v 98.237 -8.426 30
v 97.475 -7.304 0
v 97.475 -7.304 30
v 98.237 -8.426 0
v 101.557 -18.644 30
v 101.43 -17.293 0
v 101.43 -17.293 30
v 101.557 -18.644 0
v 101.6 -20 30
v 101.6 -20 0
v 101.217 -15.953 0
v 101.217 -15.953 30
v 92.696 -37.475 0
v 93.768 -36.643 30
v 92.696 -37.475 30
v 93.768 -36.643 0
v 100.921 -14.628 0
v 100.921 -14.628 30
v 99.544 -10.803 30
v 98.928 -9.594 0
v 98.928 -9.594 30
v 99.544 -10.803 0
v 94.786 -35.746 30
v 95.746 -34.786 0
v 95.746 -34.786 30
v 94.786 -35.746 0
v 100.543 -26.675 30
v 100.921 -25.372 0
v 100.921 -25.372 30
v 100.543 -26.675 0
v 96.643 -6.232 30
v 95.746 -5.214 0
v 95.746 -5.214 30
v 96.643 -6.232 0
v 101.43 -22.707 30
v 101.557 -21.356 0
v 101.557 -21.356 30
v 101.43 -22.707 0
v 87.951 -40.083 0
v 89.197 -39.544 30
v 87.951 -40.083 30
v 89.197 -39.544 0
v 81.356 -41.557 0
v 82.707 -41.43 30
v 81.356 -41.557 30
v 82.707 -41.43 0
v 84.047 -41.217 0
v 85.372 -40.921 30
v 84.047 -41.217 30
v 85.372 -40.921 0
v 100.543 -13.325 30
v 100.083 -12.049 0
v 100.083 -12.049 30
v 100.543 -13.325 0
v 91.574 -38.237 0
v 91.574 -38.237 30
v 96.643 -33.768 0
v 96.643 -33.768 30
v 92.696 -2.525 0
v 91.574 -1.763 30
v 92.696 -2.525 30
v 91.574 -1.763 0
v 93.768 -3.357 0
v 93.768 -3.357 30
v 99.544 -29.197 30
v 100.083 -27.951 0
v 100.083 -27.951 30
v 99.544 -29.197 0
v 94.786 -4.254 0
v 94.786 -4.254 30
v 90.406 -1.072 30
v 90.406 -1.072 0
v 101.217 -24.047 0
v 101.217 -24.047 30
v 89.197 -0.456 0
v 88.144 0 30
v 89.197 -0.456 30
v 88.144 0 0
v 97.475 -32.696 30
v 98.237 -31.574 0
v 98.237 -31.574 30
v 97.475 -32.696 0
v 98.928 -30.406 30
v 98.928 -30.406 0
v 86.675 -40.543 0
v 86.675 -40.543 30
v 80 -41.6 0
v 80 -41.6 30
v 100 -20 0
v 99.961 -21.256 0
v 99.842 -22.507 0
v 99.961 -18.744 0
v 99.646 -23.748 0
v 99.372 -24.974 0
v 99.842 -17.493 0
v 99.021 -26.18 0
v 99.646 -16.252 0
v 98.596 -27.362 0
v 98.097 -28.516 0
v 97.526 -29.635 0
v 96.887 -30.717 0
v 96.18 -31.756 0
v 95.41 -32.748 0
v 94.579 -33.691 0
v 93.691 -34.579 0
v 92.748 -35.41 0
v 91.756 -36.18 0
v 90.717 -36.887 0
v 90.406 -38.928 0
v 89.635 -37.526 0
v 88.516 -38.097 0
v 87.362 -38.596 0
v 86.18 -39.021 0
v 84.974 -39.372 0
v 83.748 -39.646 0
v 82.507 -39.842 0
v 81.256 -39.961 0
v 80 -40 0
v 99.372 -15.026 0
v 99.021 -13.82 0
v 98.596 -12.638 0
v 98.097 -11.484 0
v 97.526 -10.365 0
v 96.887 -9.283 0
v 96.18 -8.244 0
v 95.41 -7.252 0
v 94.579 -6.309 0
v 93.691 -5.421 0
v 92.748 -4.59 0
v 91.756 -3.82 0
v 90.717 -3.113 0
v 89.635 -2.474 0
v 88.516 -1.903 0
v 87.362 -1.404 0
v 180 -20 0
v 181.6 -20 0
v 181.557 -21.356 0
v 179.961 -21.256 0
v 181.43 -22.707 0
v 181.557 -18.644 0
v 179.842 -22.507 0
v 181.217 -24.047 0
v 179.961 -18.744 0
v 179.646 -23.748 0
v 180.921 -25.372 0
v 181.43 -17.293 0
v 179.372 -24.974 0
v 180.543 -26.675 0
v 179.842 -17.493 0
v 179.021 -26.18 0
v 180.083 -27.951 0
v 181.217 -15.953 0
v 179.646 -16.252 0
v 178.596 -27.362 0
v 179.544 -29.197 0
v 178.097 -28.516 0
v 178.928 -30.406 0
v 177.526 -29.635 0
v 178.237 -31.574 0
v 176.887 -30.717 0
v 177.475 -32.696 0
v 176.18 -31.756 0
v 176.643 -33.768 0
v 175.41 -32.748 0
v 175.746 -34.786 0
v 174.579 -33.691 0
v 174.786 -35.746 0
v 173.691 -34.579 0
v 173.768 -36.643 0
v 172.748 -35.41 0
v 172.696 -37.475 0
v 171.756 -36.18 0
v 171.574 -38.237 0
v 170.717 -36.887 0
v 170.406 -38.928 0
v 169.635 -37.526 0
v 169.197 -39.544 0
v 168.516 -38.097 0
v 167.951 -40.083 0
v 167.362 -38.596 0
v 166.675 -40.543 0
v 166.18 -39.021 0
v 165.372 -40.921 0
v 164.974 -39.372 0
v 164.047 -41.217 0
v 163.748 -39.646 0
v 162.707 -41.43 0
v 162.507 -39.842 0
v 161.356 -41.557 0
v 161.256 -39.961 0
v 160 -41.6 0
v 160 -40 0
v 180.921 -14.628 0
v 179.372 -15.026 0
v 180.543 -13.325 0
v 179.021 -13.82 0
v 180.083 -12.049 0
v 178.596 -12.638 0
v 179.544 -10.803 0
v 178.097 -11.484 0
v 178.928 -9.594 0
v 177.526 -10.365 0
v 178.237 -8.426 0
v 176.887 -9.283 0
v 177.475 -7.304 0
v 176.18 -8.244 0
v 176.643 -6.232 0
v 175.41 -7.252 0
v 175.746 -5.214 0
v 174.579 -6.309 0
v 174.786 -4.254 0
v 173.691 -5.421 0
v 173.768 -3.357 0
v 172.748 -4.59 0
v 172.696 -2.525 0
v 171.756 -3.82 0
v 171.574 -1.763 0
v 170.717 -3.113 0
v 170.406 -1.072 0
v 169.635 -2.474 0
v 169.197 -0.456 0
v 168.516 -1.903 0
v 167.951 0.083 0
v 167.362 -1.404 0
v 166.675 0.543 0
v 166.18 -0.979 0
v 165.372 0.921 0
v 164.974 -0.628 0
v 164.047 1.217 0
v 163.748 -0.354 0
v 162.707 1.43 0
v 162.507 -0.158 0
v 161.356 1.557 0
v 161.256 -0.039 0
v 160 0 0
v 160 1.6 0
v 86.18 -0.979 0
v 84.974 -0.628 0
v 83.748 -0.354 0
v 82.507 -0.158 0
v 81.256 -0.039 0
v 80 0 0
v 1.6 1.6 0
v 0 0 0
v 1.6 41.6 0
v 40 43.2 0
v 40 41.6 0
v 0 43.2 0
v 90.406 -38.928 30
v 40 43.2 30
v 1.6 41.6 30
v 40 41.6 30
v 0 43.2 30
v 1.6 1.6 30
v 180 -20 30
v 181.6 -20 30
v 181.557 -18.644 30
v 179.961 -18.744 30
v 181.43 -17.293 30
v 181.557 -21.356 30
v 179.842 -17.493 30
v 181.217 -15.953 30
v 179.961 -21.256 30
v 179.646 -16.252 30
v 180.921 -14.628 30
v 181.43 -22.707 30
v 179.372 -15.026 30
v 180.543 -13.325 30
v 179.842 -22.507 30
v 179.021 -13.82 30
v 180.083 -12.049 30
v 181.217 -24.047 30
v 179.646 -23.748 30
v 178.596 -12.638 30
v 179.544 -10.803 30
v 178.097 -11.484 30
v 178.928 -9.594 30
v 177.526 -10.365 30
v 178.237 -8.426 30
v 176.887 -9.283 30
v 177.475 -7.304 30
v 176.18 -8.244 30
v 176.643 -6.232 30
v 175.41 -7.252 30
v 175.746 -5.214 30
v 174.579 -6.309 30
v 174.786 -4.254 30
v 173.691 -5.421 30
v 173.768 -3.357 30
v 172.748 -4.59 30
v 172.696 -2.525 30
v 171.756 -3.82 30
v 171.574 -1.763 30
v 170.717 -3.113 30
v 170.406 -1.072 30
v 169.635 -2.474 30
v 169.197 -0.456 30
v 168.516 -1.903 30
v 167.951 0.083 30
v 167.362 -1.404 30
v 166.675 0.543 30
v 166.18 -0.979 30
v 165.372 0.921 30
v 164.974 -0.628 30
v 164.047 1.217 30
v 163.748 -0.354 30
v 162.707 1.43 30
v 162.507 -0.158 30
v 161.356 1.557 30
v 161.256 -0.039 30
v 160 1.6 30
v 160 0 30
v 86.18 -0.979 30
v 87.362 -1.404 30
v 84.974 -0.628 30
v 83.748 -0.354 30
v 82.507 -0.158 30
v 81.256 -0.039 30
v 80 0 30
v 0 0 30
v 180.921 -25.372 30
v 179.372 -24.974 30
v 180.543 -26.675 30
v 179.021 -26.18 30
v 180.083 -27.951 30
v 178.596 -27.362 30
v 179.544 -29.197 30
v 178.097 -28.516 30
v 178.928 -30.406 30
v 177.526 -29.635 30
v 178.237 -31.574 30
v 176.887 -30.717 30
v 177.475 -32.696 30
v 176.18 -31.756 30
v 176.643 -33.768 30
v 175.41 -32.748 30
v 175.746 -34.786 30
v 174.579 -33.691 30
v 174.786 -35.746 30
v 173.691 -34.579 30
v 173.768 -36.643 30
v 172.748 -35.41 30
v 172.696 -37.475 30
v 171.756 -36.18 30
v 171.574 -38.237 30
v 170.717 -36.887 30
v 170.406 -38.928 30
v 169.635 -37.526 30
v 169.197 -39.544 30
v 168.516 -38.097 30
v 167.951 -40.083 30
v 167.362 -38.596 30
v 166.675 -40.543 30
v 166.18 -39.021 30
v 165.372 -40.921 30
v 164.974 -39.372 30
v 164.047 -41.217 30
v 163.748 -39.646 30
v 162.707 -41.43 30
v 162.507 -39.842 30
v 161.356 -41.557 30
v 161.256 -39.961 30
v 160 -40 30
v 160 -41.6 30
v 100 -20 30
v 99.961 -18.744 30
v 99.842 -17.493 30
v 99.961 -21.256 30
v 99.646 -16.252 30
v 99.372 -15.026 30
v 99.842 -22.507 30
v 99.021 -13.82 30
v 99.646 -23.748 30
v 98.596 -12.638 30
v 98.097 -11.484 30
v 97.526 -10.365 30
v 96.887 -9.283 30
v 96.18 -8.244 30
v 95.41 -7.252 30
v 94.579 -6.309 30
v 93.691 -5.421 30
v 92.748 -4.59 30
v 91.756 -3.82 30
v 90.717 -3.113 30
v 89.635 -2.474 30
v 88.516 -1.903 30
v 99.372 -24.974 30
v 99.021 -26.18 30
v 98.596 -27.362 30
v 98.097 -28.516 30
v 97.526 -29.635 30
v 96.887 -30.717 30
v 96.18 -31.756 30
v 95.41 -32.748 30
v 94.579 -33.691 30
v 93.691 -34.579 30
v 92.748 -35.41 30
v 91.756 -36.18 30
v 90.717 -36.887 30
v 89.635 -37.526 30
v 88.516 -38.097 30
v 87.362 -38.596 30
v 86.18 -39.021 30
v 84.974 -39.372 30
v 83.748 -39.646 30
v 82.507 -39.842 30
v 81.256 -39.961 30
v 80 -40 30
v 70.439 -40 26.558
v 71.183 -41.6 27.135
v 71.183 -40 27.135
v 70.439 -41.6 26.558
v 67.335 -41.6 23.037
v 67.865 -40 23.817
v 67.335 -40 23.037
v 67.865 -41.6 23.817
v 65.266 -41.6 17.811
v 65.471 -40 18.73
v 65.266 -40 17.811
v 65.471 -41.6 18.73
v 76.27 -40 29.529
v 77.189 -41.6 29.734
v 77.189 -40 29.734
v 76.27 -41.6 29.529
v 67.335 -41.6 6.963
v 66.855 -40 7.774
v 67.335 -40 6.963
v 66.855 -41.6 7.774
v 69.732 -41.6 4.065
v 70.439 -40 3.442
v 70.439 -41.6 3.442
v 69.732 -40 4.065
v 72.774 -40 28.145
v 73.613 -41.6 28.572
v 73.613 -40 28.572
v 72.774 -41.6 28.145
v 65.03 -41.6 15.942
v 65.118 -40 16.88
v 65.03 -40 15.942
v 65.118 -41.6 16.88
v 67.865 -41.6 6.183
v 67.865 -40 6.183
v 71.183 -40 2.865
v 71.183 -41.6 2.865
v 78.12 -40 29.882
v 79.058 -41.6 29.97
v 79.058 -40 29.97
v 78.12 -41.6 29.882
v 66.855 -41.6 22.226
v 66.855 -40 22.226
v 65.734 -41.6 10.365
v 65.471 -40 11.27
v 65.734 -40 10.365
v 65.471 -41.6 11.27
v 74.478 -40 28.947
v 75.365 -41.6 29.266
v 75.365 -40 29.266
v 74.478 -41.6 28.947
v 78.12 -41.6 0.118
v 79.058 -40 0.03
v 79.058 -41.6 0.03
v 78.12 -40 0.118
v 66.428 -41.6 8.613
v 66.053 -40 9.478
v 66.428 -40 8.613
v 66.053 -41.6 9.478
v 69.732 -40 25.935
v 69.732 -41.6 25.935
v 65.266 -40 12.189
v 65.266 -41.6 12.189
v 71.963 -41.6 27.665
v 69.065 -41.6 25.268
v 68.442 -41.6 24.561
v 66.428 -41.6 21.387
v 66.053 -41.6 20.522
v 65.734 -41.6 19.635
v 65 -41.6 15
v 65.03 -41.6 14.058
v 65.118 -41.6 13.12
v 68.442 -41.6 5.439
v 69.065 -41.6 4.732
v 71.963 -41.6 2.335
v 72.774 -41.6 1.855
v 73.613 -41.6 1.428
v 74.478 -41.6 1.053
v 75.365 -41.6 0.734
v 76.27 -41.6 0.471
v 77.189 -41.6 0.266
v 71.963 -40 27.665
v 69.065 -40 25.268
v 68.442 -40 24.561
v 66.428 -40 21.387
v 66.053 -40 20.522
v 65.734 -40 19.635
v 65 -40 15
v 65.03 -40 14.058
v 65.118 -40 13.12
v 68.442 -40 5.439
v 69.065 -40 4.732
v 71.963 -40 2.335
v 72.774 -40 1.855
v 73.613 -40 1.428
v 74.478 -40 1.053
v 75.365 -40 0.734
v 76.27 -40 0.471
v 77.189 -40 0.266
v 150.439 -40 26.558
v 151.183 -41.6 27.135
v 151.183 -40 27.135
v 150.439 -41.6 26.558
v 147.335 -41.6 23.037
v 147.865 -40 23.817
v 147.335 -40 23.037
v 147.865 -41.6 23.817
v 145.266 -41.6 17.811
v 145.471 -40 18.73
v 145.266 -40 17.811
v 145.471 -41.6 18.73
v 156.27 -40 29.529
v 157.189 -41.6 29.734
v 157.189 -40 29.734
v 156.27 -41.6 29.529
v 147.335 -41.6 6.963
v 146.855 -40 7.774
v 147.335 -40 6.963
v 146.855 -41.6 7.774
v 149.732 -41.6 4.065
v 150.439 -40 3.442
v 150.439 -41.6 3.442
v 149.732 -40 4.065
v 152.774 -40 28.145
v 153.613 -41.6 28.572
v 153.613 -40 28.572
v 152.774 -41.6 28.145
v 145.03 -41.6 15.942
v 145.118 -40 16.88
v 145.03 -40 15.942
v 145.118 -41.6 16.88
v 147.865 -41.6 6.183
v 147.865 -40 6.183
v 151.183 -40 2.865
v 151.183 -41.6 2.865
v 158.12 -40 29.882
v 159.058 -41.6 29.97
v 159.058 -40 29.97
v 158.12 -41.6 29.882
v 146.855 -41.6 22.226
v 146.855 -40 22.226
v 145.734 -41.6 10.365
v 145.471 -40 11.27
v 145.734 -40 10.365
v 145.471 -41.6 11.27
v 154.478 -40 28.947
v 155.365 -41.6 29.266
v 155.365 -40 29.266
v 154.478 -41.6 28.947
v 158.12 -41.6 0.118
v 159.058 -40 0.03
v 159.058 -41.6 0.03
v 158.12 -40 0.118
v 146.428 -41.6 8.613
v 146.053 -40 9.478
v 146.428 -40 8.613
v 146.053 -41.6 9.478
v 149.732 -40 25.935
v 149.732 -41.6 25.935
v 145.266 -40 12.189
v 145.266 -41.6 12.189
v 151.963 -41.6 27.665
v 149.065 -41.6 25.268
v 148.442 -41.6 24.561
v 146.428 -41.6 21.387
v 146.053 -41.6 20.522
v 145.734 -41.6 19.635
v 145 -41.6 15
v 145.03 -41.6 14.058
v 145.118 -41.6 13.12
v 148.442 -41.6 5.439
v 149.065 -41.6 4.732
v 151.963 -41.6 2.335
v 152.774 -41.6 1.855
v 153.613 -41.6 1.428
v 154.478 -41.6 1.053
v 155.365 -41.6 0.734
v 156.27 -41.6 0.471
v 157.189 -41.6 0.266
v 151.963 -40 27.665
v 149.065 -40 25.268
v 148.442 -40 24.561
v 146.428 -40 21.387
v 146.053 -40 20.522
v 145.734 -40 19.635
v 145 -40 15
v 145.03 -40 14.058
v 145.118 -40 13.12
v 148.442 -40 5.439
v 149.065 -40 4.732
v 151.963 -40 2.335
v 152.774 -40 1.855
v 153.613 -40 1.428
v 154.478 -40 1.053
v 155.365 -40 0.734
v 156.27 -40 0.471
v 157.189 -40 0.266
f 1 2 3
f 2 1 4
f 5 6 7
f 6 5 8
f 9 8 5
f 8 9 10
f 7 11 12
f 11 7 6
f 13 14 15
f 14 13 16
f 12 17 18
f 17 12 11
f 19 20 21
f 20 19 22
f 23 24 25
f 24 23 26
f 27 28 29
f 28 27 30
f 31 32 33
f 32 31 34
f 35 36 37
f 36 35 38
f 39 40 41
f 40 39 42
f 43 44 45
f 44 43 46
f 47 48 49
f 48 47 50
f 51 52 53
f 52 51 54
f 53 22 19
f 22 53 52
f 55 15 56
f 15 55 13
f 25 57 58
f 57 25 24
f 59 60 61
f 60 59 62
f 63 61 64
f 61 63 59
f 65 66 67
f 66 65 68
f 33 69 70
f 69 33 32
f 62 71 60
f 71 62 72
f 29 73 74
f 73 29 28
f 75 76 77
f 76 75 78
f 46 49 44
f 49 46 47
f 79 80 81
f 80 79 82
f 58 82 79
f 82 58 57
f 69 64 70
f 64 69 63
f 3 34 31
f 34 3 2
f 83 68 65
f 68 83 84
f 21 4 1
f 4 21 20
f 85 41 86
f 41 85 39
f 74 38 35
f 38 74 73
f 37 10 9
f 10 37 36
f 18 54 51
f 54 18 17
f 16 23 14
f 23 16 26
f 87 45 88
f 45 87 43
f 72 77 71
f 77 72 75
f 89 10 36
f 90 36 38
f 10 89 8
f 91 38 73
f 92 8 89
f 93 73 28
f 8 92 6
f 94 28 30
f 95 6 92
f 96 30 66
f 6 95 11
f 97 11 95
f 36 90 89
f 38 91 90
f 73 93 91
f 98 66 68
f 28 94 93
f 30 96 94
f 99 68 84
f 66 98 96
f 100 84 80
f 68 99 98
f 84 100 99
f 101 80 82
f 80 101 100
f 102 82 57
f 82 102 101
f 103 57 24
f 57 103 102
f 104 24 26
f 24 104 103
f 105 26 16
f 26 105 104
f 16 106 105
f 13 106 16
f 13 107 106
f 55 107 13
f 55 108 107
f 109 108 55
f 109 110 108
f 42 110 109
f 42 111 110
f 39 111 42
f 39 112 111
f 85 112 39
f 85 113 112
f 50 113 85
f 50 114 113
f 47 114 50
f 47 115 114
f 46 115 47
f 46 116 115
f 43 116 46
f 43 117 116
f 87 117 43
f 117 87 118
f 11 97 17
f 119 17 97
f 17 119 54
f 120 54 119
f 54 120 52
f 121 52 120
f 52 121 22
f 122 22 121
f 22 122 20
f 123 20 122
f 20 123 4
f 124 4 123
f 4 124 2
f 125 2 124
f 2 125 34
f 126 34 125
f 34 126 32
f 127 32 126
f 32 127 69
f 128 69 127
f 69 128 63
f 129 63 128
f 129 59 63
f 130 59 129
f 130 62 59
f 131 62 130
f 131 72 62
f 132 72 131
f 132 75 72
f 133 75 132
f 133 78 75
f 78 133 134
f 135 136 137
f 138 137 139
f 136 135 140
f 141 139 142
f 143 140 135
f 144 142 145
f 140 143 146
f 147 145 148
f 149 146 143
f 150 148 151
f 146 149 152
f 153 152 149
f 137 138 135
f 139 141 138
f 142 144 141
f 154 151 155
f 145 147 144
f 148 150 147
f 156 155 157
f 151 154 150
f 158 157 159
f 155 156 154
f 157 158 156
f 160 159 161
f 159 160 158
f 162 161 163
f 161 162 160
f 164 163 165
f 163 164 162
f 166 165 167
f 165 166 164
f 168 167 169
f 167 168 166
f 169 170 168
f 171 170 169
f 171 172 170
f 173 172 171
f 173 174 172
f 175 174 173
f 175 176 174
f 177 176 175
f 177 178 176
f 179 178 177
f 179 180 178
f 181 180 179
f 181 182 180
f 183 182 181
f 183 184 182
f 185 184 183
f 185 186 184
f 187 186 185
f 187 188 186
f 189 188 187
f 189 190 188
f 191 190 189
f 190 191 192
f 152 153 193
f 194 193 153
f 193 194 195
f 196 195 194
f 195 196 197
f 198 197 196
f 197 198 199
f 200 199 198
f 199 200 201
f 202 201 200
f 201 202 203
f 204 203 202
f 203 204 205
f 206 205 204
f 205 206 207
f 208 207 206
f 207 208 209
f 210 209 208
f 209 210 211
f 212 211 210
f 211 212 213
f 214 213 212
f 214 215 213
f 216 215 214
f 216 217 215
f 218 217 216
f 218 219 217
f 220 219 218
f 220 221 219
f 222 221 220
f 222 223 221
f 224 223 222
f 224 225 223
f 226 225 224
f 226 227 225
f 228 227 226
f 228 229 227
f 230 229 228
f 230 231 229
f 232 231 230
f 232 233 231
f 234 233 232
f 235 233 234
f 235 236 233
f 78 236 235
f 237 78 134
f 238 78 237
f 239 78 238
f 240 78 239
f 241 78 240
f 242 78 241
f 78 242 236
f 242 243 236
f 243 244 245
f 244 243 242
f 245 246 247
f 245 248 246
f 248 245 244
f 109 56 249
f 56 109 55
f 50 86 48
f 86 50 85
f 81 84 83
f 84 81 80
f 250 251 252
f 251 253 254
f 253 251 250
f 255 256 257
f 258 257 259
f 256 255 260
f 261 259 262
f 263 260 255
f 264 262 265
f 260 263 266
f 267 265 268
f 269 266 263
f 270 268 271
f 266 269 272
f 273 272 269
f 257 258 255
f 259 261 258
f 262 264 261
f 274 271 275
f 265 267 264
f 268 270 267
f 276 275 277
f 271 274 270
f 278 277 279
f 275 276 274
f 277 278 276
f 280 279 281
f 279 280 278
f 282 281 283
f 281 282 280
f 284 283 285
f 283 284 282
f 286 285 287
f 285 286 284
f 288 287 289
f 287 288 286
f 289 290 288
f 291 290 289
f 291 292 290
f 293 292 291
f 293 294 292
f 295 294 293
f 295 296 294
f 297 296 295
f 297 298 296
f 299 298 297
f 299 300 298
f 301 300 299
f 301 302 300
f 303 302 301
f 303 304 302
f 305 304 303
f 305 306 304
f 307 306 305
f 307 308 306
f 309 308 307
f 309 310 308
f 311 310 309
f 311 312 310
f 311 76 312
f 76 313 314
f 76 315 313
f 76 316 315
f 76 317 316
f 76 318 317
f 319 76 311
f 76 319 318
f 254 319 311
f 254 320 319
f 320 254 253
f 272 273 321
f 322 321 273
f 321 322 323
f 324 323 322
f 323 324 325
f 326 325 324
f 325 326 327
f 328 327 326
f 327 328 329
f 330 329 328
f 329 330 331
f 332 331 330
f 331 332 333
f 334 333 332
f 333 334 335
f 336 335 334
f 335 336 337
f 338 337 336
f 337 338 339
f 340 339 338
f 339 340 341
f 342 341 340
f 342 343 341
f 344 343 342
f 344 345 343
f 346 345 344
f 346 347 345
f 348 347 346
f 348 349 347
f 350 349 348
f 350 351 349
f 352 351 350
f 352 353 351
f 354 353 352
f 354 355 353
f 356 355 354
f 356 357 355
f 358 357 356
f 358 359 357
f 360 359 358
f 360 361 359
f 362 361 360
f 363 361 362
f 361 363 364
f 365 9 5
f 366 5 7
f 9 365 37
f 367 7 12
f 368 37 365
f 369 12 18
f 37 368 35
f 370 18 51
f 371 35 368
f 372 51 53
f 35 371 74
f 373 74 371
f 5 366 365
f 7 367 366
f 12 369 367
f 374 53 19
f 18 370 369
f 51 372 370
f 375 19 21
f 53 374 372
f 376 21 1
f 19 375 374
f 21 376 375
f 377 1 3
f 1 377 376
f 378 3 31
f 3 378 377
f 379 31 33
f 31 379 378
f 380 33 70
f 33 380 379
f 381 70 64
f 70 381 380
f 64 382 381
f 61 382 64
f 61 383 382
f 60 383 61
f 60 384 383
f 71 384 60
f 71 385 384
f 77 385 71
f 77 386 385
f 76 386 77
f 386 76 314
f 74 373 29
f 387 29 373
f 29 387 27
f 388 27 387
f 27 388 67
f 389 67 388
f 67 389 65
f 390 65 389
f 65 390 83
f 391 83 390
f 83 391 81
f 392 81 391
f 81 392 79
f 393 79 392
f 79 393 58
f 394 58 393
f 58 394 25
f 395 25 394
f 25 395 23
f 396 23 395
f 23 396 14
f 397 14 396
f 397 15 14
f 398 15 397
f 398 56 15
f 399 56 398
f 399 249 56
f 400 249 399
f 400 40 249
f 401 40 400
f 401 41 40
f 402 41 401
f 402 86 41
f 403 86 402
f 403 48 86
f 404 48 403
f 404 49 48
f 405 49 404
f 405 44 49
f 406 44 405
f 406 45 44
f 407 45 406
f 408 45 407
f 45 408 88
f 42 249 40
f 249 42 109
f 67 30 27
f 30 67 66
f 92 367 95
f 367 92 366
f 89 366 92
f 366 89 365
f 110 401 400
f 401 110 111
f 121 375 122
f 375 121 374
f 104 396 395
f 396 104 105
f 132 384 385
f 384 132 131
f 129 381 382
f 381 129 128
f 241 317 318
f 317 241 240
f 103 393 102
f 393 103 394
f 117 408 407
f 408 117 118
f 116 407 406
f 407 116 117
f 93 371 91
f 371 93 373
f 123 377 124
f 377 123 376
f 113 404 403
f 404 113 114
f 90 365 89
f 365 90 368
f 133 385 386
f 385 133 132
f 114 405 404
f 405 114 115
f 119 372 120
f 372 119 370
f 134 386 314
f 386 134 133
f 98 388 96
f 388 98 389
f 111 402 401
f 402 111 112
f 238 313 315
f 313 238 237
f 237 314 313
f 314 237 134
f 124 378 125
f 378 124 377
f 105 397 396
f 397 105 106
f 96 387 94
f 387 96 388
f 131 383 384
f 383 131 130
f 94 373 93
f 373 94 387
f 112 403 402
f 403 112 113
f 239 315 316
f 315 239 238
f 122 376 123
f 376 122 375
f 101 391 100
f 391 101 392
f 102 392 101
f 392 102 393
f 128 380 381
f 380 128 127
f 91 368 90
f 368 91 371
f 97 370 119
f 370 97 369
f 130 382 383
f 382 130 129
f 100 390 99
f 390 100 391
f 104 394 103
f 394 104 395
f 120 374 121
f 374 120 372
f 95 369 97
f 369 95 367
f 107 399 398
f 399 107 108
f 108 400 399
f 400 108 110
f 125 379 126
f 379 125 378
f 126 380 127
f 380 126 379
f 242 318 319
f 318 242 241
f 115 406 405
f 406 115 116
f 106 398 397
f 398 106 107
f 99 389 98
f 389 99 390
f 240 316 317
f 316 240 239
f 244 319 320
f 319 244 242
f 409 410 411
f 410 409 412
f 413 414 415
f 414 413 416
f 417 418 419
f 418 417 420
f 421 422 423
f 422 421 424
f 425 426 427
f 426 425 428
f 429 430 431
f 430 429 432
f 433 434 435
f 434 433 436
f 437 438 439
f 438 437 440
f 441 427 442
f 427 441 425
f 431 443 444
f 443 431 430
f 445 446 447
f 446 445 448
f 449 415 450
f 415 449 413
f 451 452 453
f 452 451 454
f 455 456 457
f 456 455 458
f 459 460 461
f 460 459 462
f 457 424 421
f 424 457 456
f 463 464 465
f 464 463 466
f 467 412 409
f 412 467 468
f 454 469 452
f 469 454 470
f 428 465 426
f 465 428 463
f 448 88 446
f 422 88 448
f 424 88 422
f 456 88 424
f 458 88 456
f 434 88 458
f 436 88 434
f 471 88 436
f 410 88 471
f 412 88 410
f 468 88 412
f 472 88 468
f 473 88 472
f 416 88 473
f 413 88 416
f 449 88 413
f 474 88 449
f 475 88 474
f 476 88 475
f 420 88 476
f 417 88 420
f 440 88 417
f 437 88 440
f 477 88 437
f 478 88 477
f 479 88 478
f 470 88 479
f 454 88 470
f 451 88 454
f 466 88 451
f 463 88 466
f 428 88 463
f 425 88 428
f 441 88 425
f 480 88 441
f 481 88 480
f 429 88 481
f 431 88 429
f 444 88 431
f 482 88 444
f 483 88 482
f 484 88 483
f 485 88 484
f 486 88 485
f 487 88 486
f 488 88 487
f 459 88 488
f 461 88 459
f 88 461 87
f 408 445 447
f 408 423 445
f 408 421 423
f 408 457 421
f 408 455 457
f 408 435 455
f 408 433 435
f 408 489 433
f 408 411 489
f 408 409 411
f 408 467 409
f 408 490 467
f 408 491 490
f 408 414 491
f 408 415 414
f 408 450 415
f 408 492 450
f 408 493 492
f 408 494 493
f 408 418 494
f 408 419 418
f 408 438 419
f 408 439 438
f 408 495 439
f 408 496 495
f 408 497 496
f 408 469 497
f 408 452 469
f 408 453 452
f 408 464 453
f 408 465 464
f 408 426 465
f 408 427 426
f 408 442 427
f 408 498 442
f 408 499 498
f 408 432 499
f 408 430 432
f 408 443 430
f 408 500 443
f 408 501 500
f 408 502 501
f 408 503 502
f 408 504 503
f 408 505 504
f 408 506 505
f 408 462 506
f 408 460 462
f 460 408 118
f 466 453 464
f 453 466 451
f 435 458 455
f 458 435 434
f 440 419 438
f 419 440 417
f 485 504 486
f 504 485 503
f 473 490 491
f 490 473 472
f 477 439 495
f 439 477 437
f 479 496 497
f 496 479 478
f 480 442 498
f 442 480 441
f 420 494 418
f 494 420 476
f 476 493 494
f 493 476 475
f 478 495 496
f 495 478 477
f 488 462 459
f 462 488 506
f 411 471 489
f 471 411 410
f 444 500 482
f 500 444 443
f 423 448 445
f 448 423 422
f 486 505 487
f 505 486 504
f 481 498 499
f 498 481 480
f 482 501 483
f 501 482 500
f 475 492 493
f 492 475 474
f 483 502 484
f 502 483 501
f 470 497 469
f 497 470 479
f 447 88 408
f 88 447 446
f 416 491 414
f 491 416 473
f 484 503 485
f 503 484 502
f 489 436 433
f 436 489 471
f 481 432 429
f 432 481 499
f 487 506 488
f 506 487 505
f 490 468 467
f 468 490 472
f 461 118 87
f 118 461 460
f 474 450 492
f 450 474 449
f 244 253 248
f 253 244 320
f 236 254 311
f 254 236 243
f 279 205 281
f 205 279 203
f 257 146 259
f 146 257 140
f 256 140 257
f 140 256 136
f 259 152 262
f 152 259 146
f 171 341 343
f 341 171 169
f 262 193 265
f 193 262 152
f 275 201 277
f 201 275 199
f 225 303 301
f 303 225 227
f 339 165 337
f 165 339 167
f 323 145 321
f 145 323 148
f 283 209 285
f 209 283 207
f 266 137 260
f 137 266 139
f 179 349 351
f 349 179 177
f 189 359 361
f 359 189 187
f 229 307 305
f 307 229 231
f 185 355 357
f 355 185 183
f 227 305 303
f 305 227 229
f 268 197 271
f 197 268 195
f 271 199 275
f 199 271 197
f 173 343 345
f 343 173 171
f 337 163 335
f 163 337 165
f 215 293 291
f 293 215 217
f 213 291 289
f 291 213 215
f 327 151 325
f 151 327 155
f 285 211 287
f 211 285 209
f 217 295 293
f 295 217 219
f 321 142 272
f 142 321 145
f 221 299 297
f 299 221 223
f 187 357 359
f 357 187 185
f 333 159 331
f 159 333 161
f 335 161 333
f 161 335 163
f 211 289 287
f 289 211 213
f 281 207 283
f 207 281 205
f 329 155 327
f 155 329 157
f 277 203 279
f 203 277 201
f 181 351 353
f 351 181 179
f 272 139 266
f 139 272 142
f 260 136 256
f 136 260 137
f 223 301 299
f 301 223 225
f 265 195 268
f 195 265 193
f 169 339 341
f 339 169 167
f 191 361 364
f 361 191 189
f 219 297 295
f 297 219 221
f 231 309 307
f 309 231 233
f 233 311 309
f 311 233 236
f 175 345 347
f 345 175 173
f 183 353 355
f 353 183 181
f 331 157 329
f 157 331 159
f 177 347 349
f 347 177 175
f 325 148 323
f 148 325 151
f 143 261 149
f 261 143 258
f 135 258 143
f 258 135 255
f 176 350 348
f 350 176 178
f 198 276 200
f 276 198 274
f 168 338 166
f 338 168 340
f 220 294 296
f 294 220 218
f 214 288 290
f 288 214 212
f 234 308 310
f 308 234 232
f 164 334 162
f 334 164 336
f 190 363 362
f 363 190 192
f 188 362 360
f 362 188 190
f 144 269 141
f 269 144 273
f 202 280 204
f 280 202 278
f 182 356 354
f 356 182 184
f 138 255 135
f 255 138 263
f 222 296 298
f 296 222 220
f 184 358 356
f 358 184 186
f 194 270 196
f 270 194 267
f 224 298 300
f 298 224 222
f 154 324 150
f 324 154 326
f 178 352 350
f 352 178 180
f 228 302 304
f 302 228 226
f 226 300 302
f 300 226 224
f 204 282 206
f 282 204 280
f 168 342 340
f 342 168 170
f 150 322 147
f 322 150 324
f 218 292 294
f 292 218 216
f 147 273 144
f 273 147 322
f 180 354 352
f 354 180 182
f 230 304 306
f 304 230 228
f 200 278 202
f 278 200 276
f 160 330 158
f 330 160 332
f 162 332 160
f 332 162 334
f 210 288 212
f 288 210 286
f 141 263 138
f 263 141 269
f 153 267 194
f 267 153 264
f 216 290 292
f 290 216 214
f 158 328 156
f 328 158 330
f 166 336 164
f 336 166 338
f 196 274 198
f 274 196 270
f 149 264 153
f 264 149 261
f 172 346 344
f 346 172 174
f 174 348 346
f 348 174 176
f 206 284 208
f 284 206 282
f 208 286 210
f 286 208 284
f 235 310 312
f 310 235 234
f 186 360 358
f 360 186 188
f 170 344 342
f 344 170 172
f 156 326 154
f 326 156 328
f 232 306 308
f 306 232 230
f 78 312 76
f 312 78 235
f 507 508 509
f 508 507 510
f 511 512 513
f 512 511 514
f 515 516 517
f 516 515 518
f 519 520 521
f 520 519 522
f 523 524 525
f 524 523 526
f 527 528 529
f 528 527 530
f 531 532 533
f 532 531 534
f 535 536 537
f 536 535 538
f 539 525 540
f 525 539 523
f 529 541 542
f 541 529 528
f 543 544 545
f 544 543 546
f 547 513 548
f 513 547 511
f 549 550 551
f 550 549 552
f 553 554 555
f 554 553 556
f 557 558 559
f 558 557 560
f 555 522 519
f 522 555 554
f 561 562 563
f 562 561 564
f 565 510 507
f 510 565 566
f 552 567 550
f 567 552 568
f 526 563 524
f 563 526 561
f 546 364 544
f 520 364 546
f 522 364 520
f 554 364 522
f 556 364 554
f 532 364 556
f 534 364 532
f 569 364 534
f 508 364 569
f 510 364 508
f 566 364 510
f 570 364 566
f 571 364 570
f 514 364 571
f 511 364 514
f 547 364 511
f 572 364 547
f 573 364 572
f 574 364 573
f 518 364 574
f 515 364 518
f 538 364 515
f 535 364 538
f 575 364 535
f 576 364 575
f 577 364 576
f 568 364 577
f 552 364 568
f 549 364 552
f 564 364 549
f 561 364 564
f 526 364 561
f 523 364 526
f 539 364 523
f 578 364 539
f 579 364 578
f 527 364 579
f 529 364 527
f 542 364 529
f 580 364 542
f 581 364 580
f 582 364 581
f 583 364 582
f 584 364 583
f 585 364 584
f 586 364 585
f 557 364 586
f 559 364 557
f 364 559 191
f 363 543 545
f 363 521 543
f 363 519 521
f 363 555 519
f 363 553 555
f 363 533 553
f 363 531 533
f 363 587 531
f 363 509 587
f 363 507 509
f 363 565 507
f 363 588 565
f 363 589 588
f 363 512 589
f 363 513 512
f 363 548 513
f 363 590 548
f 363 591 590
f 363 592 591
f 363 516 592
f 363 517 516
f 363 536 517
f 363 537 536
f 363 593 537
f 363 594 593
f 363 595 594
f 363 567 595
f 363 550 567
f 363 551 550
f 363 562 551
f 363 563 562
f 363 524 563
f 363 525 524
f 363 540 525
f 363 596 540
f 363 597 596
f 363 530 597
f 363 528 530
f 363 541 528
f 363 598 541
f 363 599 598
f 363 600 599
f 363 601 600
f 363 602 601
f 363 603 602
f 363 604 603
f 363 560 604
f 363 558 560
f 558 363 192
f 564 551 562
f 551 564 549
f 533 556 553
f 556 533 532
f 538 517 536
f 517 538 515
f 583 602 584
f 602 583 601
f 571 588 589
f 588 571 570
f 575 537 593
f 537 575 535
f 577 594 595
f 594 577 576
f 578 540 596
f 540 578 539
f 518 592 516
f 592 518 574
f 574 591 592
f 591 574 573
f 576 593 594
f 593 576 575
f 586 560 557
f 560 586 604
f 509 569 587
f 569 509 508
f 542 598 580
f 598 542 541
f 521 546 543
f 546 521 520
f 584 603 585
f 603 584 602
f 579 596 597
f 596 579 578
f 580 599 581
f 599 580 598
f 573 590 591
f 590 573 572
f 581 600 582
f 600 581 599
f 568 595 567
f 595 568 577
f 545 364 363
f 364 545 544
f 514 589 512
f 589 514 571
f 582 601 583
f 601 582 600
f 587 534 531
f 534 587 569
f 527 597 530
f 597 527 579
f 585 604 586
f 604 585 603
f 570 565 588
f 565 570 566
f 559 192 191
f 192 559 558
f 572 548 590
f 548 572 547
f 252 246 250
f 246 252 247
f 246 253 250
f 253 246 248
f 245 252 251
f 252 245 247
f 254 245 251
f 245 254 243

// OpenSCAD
$fn=100;

door_thickness=40;
door_mount_length=40;
height=80;
width=30;
thickness=1.6;
hook_size=20;
number_of_hooks=2;


translate([0,door_thickness+thickness,0]) cube([door_mount_length, thickness, width]);
cube([thickness, door_thickness+thickness*2, width]);

for(i=[0:number_of_hooks-1]) translate ([i*height,0,0]) {
    cube([height, thickness, width]);

    difference() {
        translate([height,-hook_size,0]) cylinder(  width,    hook_size+thickness,    hook_size+thickness);
        translate([height,-hook_size,-1]) cylinder(  width+2,    hook_size,    hook_size);
        translate([height-(hook_size*2+thickness),-hook_size*2-thickness,-1]) cube([hook_size*2+thickness, hook_size*2+thickness, width+2]);
    }

    difference() {
        translate([height,-hook_size*2,width/2]) rotate([90,0,0]) cylinder(  thickness,    width/2,    width/2);
        translate([height,-hook_size*2-thickness-1,0]) cube([width, thickness+2, width]);
    }
}
